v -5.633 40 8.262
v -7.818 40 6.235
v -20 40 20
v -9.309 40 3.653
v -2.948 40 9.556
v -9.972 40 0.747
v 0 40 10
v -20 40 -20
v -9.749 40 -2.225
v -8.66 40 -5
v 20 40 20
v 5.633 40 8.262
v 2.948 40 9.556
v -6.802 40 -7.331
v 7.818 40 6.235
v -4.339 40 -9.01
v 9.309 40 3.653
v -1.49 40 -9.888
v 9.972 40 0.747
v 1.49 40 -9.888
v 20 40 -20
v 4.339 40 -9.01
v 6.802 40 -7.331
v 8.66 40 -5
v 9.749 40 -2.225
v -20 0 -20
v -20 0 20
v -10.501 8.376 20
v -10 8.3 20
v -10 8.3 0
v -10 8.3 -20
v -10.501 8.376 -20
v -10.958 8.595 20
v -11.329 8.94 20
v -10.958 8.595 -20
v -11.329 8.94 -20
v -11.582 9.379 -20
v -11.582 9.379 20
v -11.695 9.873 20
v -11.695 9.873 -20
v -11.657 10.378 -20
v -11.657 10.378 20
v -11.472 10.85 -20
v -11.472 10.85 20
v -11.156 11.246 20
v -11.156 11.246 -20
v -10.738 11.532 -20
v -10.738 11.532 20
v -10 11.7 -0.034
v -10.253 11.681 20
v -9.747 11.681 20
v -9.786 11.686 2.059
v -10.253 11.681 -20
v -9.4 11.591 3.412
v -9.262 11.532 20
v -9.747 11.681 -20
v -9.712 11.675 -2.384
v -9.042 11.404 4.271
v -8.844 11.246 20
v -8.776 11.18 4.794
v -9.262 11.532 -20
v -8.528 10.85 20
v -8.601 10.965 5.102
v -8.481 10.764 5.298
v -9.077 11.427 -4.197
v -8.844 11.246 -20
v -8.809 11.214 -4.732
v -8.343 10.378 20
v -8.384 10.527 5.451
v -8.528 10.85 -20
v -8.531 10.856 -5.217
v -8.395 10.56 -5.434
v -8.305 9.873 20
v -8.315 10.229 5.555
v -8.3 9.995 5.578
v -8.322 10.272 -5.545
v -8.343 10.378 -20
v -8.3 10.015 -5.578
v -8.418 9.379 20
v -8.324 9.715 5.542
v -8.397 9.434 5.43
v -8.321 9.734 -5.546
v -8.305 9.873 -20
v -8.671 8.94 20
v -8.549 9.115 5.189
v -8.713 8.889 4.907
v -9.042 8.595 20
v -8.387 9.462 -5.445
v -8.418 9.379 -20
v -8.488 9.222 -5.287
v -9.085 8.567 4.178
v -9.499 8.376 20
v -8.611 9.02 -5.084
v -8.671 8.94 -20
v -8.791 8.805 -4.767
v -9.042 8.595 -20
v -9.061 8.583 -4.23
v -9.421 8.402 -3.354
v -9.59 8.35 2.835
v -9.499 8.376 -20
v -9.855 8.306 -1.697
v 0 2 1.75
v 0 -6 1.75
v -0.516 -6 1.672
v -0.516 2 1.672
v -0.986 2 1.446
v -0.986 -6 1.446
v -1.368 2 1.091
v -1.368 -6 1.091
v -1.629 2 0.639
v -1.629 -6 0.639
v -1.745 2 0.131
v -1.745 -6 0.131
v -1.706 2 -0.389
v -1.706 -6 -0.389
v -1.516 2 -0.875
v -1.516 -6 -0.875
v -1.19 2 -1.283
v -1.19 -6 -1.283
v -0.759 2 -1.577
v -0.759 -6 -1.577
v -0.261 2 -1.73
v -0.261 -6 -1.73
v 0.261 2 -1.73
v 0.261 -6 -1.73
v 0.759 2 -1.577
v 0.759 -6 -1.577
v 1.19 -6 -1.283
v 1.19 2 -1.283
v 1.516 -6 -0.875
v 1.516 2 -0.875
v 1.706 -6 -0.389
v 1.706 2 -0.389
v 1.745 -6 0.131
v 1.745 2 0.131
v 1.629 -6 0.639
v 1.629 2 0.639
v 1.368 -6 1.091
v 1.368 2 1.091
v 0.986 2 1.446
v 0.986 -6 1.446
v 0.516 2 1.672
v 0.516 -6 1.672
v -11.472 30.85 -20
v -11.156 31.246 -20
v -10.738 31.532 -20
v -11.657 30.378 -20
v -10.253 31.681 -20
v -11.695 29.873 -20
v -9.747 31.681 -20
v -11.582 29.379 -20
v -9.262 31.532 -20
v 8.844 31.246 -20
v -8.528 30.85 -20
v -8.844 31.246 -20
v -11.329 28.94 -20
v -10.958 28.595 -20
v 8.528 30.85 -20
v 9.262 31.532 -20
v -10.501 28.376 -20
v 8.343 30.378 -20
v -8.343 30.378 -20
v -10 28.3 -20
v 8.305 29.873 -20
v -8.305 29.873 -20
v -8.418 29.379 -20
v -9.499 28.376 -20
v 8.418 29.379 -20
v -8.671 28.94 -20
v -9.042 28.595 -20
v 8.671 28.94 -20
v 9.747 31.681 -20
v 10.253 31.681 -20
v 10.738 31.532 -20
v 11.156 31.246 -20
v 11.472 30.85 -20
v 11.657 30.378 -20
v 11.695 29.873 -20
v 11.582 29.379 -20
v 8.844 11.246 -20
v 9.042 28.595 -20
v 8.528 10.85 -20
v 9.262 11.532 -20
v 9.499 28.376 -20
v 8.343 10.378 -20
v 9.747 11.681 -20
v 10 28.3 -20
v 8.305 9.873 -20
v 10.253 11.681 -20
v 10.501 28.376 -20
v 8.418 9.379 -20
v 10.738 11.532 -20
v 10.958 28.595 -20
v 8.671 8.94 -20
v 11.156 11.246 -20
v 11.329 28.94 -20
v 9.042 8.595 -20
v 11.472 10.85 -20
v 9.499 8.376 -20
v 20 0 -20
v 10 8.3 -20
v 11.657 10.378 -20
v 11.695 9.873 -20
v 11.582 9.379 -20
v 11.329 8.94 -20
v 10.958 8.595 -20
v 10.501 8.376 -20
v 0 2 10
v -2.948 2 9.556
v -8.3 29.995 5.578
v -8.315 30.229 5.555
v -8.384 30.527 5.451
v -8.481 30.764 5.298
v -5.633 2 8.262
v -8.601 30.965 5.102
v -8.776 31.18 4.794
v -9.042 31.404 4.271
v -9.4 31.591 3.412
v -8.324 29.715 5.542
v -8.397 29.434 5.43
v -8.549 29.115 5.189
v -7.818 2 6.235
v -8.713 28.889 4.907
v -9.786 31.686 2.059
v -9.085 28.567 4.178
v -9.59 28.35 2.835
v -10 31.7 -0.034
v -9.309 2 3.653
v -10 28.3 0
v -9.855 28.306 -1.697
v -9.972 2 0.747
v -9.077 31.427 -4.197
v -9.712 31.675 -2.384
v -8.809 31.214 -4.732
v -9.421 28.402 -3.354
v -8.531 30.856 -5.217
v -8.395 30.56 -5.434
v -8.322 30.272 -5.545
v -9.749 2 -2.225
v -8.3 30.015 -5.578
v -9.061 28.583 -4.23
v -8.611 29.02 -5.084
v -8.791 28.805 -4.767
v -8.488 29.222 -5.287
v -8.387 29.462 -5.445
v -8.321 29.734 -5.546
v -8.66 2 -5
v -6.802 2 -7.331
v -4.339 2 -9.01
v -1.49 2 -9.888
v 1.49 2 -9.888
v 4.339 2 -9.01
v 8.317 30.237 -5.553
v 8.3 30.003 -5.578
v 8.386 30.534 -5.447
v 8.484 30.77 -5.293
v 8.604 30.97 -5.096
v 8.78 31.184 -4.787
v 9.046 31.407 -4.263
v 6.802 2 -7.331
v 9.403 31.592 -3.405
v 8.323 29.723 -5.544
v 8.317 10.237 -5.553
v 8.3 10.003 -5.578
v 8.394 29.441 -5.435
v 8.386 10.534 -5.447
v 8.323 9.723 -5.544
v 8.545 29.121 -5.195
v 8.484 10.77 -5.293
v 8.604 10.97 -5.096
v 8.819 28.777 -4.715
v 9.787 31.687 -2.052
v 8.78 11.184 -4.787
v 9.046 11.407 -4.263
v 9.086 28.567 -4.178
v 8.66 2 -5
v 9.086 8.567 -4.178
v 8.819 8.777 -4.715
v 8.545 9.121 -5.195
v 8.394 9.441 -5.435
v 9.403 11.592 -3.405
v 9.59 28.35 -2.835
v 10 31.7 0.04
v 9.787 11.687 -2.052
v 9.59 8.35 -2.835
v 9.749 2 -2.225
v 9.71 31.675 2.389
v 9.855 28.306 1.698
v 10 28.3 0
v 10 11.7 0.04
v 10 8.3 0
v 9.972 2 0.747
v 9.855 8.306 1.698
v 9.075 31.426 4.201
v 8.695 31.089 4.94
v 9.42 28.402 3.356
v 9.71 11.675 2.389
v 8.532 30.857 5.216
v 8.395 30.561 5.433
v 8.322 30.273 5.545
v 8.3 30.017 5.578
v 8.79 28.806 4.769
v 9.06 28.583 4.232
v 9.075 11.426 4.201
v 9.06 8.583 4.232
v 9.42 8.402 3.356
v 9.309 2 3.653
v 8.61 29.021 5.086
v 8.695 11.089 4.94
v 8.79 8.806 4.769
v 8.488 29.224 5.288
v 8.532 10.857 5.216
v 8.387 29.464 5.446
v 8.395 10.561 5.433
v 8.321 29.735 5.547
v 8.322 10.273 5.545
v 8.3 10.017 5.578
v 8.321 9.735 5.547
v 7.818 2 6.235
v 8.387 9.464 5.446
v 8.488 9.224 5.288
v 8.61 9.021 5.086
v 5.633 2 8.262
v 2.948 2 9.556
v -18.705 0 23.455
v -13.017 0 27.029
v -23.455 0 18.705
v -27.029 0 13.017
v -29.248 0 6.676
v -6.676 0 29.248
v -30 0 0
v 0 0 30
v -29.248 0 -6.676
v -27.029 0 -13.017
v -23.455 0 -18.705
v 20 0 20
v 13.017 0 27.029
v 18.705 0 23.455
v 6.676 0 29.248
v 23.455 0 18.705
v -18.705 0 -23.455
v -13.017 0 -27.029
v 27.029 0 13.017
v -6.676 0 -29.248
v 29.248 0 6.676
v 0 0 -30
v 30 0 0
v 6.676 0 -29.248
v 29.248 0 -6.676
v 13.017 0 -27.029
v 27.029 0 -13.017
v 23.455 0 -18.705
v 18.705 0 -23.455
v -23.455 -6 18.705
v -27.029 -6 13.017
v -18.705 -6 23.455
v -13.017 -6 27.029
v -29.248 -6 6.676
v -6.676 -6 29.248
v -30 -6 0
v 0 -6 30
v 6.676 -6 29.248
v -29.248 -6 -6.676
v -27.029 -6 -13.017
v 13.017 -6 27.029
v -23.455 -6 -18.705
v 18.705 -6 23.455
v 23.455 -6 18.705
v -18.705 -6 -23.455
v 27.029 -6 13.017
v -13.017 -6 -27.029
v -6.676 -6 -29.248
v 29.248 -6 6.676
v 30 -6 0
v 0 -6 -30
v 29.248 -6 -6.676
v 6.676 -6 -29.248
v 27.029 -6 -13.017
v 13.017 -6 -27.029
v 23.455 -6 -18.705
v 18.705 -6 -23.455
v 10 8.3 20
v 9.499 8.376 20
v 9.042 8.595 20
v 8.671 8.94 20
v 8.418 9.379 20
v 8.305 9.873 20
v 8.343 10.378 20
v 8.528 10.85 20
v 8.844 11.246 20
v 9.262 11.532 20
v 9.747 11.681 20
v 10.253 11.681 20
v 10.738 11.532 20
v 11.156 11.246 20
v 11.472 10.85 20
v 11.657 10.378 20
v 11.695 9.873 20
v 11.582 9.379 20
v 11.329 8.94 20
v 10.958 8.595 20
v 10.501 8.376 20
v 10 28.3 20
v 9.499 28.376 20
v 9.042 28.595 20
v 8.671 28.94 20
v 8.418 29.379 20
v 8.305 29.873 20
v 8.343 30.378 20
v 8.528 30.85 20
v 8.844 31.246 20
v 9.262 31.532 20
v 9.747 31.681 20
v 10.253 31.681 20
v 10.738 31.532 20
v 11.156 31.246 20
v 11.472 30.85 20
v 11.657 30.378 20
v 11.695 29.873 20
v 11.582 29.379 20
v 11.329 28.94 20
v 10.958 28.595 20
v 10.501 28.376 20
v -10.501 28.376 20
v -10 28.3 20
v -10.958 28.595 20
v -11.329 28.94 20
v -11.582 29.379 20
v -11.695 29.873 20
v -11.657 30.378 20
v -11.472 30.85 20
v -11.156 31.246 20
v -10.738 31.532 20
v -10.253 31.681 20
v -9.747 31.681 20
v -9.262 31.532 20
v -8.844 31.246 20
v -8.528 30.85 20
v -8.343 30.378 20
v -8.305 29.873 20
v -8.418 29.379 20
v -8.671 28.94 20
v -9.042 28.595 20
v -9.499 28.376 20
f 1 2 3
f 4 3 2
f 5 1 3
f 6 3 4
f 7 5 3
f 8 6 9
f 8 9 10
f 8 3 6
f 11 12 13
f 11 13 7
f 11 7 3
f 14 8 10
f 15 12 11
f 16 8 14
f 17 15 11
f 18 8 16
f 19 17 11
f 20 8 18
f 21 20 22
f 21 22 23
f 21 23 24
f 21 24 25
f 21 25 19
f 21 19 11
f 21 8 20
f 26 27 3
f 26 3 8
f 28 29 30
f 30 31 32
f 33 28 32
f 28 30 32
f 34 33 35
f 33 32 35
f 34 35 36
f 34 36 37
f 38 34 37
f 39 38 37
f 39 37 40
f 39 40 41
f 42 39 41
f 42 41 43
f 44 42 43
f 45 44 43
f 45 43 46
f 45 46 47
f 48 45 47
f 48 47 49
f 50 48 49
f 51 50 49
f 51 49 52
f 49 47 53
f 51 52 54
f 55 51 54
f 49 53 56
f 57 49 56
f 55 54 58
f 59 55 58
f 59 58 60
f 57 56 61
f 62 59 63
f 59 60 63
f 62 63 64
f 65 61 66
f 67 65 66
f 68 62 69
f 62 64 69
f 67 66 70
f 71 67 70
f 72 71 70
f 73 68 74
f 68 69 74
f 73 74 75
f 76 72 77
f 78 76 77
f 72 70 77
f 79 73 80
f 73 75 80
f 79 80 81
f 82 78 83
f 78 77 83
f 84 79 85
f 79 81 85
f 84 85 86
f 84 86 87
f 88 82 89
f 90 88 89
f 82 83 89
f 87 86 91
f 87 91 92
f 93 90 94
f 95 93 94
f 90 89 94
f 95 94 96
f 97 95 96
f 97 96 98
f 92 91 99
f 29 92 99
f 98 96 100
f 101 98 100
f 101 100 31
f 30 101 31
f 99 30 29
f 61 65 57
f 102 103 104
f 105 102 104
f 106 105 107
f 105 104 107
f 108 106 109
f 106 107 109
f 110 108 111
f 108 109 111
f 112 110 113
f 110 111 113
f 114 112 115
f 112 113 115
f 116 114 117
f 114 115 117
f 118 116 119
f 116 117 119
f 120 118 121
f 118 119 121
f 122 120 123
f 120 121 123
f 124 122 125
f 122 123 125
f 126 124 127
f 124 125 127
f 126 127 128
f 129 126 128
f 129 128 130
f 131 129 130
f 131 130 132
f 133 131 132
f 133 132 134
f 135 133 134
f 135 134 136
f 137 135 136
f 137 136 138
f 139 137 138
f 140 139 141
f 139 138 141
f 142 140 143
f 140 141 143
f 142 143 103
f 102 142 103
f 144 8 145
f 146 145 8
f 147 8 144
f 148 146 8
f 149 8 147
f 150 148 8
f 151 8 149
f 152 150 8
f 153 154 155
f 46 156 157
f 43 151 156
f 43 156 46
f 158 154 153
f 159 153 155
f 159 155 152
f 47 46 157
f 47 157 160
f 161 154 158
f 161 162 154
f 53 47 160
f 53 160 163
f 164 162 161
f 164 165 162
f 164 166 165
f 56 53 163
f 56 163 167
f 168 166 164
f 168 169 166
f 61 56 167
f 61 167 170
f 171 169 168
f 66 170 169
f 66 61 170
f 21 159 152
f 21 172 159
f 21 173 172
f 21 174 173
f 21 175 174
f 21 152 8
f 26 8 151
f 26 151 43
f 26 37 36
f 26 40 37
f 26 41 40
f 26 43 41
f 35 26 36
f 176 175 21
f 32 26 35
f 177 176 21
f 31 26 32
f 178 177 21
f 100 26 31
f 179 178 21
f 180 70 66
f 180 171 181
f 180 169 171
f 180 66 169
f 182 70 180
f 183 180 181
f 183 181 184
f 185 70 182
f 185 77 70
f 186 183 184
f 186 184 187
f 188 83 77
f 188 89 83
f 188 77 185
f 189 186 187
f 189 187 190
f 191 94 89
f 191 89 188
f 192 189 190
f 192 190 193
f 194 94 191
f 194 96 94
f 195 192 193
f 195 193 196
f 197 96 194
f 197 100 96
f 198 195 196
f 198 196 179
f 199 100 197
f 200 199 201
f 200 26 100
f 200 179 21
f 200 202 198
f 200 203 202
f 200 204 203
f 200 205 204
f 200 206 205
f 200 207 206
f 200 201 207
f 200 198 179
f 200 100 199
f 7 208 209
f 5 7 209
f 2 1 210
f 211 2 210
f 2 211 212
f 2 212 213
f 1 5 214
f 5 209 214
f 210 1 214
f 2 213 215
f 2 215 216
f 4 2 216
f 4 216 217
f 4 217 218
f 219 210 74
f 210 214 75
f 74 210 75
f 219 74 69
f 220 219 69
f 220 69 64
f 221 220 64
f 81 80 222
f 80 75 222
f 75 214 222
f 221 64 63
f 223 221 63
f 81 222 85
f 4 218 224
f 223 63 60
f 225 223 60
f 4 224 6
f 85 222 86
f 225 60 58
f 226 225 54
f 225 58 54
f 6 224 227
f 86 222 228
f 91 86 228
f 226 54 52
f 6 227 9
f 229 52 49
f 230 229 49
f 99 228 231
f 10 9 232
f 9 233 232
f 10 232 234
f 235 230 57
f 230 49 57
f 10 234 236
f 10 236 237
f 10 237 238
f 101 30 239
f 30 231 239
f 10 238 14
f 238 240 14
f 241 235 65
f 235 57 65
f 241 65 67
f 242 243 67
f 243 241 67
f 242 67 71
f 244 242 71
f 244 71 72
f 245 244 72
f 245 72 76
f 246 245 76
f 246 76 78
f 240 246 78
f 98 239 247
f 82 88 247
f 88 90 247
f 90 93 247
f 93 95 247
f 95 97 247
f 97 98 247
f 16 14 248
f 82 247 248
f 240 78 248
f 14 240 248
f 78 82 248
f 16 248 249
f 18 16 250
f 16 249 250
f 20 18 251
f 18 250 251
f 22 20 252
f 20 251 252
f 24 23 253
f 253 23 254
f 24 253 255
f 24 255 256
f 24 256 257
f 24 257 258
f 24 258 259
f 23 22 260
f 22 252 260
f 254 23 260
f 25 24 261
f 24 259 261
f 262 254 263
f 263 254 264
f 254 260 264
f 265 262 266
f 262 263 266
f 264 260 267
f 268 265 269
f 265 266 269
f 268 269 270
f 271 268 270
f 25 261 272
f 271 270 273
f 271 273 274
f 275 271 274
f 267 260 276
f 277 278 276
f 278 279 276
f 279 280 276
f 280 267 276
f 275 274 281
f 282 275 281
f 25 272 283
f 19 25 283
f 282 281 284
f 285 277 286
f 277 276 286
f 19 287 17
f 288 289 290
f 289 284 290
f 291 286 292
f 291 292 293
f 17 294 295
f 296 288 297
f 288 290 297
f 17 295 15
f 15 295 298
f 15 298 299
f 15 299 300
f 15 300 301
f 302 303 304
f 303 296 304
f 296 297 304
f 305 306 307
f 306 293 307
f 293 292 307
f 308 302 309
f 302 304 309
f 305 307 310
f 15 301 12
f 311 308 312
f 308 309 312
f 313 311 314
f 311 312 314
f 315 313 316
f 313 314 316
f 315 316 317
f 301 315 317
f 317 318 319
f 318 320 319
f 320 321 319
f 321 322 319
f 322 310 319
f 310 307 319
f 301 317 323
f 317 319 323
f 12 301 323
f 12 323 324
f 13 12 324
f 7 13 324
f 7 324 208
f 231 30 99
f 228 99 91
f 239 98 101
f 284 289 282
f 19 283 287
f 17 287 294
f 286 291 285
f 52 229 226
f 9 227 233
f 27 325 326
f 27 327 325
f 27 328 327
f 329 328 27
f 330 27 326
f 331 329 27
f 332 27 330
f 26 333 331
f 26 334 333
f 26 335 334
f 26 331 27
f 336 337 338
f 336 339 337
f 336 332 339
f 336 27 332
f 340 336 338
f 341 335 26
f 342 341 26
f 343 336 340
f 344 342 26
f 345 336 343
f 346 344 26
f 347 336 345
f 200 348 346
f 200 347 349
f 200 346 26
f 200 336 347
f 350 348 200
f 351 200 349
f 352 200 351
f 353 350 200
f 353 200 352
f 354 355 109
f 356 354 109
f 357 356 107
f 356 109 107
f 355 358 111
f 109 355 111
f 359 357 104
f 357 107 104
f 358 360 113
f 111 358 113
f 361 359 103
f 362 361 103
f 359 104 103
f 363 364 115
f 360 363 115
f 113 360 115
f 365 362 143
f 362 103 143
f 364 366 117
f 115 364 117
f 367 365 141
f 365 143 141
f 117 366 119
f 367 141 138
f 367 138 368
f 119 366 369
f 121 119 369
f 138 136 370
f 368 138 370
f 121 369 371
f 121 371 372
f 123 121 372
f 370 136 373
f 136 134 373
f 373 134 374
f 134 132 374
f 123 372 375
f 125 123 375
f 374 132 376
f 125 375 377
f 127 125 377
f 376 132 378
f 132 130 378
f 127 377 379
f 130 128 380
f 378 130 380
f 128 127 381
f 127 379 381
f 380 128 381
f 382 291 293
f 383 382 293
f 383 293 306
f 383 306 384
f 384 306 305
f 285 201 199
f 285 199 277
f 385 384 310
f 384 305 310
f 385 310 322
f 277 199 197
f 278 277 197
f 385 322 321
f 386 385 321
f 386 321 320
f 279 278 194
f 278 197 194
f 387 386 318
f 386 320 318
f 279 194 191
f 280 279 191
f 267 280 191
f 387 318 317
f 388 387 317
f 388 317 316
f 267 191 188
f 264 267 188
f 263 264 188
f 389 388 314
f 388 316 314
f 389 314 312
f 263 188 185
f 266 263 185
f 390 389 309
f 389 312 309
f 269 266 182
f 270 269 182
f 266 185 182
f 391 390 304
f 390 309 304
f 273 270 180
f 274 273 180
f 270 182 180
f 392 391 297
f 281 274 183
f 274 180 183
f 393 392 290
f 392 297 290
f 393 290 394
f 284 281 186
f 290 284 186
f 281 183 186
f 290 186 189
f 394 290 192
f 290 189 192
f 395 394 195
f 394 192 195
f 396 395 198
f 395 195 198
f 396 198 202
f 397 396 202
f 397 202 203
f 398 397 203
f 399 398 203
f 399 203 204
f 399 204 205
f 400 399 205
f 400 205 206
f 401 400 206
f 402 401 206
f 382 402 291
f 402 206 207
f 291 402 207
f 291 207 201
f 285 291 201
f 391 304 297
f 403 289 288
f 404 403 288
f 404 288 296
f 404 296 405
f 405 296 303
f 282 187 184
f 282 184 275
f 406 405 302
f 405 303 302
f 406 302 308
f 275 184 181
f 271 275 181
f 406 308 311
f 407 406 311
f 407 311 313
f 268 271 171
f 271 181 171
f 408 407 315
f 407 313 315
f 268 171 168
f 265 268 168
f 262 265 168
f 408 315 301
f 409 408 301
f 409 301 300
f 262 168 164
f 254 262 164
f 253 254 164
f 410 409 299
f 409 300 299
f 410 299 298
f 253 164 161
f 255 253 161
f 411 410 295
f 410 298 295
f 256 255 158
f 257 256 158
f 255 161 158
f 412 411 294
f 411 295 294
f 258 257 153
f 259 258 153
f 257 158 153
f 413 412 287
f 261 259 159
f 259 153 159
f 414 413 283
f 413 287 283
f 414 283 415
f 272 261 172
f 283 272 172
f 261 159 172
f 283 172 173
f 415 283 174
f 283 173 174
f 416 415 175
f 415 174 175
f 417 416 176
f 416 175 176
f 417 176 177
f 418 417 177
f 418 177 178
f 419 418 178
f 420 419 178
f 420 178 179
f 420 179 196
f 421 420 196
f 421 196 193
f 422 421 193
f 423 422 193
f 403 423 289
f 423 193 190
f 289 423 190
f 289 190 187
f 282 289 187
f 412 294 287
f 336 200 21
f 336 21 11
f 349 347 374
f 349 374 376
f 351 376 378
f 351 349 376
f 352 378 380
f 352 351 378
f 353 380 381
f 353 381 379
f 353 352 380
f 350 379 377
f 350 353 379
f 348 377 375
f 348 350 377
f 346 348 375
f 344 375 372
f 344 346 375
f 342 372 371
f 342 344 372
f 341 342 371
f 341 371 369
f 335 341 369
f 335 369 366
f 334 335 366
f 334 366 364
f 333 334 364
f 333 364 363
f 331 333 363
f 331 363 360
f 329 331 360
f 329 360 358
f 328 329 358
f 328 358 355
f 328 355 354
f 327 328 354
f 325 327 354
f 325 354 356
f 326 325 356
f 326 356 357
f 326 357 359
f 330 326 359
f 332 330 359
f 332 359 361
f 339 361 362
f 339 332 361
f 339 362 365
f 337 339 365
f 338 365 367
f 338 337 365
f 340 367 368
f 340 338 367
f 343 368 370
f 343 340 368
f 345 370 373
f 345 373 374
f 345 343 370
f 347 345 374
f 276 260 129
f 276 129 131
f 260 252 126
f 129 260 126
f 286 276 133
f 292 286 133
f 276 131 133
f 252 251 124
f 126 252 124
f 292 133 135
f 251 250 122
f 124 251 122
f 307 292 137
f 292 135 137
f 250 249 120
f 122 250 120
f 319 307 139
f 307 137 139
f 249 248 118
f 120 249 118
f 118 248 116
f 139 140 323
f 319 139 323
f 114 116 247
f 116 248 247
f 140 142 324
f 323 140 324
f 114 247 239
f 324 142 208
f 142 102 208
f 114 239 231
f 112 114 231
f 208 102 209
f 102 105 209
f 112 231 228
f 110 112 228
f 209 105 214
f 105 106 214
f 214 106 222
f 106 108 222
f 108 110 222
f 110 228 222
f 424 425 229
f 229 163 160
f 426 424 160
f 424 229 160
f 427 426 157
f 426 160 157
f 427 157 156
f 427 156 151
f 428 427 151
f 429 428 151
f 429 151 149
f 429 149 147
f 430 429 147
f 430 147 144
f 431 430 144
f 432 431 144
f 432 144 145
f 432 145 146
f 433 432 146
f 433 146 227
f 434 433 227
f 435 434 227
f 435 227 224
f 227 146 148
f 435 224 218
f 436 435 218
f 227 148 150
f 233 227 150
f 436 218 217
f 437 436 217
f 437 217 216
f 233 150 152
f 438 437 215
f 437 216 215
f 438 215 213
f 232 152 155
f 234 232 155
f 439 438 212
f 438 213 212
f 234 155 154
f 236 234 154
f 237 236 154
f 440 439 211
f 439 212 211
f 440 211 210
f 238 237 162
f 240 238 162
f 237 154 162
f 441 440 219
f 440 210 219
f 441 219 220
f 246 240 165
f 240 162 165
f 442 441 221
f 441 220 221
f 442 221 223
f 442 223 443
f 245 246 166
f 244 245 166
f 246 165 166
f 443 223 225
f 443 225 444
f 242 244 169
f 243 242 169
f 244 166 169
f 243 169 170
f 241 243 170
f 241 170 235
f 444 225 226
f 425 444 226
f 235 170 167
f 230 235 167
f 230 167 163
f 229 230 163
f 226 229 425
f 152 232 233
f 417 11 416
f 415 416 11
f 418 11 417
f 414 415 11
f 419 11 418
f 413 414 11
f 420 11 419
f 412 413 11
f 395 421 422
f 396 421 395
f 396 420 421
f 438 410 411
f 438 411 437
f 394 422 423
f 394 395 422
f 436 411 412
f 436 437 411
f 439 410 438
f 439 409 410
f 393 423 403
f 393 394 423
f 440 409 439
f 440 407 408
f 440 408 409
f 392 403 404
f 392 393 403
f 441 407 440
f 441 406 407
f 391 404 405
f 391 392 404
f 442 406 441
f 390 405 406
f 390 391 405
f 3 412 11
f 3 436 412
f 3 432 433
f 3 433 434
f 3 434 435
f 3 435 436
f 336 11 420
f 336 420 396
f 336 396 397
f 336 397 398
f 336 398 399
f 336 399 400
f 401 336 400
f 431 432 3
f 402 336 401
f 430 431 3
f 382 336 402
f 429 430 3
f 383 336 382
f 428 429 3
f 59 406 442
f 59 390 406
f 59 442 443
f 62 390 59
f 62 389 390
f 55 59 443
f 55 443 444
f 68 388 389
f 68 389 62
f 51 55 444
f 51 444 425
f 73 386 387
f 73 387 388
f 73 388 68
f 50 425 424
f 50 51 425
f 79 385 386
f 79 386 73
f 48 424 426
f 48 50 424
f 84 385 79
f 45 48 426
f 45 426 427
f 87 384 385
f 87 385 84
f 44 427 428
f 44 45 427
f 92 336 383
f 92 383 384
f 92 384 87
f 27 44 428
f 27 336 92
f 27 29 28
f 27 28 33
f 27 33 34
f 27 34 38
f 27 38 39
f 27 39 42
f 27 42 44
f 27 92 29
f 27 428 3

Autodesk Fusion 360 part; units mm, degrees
sketch "Sketch1" plane through (0, 0, 0) normal (0, 1, 0) x (1, 0, 0)
  line L0 (47.5, -22.5) -> (-47.5, -22.5)
  line L1 (-47.5, -22.5) -> (-47.5, 22.5)
  line L2 (-47.5, 22.5) -> (47.5, 22.5)
  line L3 (47.5, 22.5) -> (47.5, -22.5)
  line L4 (47.5, -22.5) -> (-47.5, 22.5) construction
  line L5 (-47.5, -22.5) -> (47.5, 22.5) construction
  line L6 (20, -20) -> (-20, -20)
  line L7 (-20, -20) -> (-20, 20)
  line L8 (-20, 20) -> (20, 20)
  line L9 (20, 20) -> (20, -20)
  line L10 (20, -20) -> (-20, 20) construction
  line L11 (-20, -20) -> (20, 20) construction
  circle A0 centre (0, 0) radius 30
  point P0 (-41, 0)
  point P1 (41, 0)
  dimension "d1" = 95
  dimension "d2" = 45
  dimension "d3" = 82
  dimension "d4" = 41
  dimension "d11" = 40
  dimension "d12" = 40
  dimension "d26" = 60
extrude "Extrude1" add sketch "Sketch1" against normal blind 6 contours L0 A0 | L0 L2 A0 | L2 A0 | L6 L7 L8 L9
hole "Hole1" at (-41, 0, 0) at (41, 0, 0) direction (0, -1, 0) diameter 3.4 depth 35 tip angle 118 counterbore diameter 6.5 counterbore depth 3
extrude "Extrude2" add sketch "Sketch1" along normal blind 40 contours L6 L7 L8 L9
sketch "Sketch2" plane through (0, 0, 20) normal (0, 0, 1) x (1, 0, 0)
  line L0 (-20, 0) -> (20, 0)
  line L1 (20, 0) -> (20, 40)
  line L2 (20, 40) -> (-20, 40)
  line L3 (-20, 40) -> (-20, 0)
  point P0 (-10, 30)
  point P1 (10, 30)
  point P2 (10, 10)
  point P3 (-10, 10)
hole "Hole2" at (10, 30, 20) at (-10, 30, 20) at (-10, 10, 20) at (10, 10, 20) direction (0, 0, -1) diameter 3.4 depth 44 tip angle 118
sketch "Sketch3" plane through (0, 40, 0) normal (0, 1, 0) x (-1, 0, 0)
  line L0 (-20, -20) -> (20, -20)
  line L1 (20, -20) -> (20, 20)
  line L2 (20, 20) -> (-20, 20)
  line L3 (-20, 20) -> (-20, -20)
hole "Hole3" at (0, 40, 0) direction (0, -1, 0) diameter 3.5 depth 50 tip angle 118 counterbore diameter 20 counterbore depth 38
equation "d4 = d3 / 2"
